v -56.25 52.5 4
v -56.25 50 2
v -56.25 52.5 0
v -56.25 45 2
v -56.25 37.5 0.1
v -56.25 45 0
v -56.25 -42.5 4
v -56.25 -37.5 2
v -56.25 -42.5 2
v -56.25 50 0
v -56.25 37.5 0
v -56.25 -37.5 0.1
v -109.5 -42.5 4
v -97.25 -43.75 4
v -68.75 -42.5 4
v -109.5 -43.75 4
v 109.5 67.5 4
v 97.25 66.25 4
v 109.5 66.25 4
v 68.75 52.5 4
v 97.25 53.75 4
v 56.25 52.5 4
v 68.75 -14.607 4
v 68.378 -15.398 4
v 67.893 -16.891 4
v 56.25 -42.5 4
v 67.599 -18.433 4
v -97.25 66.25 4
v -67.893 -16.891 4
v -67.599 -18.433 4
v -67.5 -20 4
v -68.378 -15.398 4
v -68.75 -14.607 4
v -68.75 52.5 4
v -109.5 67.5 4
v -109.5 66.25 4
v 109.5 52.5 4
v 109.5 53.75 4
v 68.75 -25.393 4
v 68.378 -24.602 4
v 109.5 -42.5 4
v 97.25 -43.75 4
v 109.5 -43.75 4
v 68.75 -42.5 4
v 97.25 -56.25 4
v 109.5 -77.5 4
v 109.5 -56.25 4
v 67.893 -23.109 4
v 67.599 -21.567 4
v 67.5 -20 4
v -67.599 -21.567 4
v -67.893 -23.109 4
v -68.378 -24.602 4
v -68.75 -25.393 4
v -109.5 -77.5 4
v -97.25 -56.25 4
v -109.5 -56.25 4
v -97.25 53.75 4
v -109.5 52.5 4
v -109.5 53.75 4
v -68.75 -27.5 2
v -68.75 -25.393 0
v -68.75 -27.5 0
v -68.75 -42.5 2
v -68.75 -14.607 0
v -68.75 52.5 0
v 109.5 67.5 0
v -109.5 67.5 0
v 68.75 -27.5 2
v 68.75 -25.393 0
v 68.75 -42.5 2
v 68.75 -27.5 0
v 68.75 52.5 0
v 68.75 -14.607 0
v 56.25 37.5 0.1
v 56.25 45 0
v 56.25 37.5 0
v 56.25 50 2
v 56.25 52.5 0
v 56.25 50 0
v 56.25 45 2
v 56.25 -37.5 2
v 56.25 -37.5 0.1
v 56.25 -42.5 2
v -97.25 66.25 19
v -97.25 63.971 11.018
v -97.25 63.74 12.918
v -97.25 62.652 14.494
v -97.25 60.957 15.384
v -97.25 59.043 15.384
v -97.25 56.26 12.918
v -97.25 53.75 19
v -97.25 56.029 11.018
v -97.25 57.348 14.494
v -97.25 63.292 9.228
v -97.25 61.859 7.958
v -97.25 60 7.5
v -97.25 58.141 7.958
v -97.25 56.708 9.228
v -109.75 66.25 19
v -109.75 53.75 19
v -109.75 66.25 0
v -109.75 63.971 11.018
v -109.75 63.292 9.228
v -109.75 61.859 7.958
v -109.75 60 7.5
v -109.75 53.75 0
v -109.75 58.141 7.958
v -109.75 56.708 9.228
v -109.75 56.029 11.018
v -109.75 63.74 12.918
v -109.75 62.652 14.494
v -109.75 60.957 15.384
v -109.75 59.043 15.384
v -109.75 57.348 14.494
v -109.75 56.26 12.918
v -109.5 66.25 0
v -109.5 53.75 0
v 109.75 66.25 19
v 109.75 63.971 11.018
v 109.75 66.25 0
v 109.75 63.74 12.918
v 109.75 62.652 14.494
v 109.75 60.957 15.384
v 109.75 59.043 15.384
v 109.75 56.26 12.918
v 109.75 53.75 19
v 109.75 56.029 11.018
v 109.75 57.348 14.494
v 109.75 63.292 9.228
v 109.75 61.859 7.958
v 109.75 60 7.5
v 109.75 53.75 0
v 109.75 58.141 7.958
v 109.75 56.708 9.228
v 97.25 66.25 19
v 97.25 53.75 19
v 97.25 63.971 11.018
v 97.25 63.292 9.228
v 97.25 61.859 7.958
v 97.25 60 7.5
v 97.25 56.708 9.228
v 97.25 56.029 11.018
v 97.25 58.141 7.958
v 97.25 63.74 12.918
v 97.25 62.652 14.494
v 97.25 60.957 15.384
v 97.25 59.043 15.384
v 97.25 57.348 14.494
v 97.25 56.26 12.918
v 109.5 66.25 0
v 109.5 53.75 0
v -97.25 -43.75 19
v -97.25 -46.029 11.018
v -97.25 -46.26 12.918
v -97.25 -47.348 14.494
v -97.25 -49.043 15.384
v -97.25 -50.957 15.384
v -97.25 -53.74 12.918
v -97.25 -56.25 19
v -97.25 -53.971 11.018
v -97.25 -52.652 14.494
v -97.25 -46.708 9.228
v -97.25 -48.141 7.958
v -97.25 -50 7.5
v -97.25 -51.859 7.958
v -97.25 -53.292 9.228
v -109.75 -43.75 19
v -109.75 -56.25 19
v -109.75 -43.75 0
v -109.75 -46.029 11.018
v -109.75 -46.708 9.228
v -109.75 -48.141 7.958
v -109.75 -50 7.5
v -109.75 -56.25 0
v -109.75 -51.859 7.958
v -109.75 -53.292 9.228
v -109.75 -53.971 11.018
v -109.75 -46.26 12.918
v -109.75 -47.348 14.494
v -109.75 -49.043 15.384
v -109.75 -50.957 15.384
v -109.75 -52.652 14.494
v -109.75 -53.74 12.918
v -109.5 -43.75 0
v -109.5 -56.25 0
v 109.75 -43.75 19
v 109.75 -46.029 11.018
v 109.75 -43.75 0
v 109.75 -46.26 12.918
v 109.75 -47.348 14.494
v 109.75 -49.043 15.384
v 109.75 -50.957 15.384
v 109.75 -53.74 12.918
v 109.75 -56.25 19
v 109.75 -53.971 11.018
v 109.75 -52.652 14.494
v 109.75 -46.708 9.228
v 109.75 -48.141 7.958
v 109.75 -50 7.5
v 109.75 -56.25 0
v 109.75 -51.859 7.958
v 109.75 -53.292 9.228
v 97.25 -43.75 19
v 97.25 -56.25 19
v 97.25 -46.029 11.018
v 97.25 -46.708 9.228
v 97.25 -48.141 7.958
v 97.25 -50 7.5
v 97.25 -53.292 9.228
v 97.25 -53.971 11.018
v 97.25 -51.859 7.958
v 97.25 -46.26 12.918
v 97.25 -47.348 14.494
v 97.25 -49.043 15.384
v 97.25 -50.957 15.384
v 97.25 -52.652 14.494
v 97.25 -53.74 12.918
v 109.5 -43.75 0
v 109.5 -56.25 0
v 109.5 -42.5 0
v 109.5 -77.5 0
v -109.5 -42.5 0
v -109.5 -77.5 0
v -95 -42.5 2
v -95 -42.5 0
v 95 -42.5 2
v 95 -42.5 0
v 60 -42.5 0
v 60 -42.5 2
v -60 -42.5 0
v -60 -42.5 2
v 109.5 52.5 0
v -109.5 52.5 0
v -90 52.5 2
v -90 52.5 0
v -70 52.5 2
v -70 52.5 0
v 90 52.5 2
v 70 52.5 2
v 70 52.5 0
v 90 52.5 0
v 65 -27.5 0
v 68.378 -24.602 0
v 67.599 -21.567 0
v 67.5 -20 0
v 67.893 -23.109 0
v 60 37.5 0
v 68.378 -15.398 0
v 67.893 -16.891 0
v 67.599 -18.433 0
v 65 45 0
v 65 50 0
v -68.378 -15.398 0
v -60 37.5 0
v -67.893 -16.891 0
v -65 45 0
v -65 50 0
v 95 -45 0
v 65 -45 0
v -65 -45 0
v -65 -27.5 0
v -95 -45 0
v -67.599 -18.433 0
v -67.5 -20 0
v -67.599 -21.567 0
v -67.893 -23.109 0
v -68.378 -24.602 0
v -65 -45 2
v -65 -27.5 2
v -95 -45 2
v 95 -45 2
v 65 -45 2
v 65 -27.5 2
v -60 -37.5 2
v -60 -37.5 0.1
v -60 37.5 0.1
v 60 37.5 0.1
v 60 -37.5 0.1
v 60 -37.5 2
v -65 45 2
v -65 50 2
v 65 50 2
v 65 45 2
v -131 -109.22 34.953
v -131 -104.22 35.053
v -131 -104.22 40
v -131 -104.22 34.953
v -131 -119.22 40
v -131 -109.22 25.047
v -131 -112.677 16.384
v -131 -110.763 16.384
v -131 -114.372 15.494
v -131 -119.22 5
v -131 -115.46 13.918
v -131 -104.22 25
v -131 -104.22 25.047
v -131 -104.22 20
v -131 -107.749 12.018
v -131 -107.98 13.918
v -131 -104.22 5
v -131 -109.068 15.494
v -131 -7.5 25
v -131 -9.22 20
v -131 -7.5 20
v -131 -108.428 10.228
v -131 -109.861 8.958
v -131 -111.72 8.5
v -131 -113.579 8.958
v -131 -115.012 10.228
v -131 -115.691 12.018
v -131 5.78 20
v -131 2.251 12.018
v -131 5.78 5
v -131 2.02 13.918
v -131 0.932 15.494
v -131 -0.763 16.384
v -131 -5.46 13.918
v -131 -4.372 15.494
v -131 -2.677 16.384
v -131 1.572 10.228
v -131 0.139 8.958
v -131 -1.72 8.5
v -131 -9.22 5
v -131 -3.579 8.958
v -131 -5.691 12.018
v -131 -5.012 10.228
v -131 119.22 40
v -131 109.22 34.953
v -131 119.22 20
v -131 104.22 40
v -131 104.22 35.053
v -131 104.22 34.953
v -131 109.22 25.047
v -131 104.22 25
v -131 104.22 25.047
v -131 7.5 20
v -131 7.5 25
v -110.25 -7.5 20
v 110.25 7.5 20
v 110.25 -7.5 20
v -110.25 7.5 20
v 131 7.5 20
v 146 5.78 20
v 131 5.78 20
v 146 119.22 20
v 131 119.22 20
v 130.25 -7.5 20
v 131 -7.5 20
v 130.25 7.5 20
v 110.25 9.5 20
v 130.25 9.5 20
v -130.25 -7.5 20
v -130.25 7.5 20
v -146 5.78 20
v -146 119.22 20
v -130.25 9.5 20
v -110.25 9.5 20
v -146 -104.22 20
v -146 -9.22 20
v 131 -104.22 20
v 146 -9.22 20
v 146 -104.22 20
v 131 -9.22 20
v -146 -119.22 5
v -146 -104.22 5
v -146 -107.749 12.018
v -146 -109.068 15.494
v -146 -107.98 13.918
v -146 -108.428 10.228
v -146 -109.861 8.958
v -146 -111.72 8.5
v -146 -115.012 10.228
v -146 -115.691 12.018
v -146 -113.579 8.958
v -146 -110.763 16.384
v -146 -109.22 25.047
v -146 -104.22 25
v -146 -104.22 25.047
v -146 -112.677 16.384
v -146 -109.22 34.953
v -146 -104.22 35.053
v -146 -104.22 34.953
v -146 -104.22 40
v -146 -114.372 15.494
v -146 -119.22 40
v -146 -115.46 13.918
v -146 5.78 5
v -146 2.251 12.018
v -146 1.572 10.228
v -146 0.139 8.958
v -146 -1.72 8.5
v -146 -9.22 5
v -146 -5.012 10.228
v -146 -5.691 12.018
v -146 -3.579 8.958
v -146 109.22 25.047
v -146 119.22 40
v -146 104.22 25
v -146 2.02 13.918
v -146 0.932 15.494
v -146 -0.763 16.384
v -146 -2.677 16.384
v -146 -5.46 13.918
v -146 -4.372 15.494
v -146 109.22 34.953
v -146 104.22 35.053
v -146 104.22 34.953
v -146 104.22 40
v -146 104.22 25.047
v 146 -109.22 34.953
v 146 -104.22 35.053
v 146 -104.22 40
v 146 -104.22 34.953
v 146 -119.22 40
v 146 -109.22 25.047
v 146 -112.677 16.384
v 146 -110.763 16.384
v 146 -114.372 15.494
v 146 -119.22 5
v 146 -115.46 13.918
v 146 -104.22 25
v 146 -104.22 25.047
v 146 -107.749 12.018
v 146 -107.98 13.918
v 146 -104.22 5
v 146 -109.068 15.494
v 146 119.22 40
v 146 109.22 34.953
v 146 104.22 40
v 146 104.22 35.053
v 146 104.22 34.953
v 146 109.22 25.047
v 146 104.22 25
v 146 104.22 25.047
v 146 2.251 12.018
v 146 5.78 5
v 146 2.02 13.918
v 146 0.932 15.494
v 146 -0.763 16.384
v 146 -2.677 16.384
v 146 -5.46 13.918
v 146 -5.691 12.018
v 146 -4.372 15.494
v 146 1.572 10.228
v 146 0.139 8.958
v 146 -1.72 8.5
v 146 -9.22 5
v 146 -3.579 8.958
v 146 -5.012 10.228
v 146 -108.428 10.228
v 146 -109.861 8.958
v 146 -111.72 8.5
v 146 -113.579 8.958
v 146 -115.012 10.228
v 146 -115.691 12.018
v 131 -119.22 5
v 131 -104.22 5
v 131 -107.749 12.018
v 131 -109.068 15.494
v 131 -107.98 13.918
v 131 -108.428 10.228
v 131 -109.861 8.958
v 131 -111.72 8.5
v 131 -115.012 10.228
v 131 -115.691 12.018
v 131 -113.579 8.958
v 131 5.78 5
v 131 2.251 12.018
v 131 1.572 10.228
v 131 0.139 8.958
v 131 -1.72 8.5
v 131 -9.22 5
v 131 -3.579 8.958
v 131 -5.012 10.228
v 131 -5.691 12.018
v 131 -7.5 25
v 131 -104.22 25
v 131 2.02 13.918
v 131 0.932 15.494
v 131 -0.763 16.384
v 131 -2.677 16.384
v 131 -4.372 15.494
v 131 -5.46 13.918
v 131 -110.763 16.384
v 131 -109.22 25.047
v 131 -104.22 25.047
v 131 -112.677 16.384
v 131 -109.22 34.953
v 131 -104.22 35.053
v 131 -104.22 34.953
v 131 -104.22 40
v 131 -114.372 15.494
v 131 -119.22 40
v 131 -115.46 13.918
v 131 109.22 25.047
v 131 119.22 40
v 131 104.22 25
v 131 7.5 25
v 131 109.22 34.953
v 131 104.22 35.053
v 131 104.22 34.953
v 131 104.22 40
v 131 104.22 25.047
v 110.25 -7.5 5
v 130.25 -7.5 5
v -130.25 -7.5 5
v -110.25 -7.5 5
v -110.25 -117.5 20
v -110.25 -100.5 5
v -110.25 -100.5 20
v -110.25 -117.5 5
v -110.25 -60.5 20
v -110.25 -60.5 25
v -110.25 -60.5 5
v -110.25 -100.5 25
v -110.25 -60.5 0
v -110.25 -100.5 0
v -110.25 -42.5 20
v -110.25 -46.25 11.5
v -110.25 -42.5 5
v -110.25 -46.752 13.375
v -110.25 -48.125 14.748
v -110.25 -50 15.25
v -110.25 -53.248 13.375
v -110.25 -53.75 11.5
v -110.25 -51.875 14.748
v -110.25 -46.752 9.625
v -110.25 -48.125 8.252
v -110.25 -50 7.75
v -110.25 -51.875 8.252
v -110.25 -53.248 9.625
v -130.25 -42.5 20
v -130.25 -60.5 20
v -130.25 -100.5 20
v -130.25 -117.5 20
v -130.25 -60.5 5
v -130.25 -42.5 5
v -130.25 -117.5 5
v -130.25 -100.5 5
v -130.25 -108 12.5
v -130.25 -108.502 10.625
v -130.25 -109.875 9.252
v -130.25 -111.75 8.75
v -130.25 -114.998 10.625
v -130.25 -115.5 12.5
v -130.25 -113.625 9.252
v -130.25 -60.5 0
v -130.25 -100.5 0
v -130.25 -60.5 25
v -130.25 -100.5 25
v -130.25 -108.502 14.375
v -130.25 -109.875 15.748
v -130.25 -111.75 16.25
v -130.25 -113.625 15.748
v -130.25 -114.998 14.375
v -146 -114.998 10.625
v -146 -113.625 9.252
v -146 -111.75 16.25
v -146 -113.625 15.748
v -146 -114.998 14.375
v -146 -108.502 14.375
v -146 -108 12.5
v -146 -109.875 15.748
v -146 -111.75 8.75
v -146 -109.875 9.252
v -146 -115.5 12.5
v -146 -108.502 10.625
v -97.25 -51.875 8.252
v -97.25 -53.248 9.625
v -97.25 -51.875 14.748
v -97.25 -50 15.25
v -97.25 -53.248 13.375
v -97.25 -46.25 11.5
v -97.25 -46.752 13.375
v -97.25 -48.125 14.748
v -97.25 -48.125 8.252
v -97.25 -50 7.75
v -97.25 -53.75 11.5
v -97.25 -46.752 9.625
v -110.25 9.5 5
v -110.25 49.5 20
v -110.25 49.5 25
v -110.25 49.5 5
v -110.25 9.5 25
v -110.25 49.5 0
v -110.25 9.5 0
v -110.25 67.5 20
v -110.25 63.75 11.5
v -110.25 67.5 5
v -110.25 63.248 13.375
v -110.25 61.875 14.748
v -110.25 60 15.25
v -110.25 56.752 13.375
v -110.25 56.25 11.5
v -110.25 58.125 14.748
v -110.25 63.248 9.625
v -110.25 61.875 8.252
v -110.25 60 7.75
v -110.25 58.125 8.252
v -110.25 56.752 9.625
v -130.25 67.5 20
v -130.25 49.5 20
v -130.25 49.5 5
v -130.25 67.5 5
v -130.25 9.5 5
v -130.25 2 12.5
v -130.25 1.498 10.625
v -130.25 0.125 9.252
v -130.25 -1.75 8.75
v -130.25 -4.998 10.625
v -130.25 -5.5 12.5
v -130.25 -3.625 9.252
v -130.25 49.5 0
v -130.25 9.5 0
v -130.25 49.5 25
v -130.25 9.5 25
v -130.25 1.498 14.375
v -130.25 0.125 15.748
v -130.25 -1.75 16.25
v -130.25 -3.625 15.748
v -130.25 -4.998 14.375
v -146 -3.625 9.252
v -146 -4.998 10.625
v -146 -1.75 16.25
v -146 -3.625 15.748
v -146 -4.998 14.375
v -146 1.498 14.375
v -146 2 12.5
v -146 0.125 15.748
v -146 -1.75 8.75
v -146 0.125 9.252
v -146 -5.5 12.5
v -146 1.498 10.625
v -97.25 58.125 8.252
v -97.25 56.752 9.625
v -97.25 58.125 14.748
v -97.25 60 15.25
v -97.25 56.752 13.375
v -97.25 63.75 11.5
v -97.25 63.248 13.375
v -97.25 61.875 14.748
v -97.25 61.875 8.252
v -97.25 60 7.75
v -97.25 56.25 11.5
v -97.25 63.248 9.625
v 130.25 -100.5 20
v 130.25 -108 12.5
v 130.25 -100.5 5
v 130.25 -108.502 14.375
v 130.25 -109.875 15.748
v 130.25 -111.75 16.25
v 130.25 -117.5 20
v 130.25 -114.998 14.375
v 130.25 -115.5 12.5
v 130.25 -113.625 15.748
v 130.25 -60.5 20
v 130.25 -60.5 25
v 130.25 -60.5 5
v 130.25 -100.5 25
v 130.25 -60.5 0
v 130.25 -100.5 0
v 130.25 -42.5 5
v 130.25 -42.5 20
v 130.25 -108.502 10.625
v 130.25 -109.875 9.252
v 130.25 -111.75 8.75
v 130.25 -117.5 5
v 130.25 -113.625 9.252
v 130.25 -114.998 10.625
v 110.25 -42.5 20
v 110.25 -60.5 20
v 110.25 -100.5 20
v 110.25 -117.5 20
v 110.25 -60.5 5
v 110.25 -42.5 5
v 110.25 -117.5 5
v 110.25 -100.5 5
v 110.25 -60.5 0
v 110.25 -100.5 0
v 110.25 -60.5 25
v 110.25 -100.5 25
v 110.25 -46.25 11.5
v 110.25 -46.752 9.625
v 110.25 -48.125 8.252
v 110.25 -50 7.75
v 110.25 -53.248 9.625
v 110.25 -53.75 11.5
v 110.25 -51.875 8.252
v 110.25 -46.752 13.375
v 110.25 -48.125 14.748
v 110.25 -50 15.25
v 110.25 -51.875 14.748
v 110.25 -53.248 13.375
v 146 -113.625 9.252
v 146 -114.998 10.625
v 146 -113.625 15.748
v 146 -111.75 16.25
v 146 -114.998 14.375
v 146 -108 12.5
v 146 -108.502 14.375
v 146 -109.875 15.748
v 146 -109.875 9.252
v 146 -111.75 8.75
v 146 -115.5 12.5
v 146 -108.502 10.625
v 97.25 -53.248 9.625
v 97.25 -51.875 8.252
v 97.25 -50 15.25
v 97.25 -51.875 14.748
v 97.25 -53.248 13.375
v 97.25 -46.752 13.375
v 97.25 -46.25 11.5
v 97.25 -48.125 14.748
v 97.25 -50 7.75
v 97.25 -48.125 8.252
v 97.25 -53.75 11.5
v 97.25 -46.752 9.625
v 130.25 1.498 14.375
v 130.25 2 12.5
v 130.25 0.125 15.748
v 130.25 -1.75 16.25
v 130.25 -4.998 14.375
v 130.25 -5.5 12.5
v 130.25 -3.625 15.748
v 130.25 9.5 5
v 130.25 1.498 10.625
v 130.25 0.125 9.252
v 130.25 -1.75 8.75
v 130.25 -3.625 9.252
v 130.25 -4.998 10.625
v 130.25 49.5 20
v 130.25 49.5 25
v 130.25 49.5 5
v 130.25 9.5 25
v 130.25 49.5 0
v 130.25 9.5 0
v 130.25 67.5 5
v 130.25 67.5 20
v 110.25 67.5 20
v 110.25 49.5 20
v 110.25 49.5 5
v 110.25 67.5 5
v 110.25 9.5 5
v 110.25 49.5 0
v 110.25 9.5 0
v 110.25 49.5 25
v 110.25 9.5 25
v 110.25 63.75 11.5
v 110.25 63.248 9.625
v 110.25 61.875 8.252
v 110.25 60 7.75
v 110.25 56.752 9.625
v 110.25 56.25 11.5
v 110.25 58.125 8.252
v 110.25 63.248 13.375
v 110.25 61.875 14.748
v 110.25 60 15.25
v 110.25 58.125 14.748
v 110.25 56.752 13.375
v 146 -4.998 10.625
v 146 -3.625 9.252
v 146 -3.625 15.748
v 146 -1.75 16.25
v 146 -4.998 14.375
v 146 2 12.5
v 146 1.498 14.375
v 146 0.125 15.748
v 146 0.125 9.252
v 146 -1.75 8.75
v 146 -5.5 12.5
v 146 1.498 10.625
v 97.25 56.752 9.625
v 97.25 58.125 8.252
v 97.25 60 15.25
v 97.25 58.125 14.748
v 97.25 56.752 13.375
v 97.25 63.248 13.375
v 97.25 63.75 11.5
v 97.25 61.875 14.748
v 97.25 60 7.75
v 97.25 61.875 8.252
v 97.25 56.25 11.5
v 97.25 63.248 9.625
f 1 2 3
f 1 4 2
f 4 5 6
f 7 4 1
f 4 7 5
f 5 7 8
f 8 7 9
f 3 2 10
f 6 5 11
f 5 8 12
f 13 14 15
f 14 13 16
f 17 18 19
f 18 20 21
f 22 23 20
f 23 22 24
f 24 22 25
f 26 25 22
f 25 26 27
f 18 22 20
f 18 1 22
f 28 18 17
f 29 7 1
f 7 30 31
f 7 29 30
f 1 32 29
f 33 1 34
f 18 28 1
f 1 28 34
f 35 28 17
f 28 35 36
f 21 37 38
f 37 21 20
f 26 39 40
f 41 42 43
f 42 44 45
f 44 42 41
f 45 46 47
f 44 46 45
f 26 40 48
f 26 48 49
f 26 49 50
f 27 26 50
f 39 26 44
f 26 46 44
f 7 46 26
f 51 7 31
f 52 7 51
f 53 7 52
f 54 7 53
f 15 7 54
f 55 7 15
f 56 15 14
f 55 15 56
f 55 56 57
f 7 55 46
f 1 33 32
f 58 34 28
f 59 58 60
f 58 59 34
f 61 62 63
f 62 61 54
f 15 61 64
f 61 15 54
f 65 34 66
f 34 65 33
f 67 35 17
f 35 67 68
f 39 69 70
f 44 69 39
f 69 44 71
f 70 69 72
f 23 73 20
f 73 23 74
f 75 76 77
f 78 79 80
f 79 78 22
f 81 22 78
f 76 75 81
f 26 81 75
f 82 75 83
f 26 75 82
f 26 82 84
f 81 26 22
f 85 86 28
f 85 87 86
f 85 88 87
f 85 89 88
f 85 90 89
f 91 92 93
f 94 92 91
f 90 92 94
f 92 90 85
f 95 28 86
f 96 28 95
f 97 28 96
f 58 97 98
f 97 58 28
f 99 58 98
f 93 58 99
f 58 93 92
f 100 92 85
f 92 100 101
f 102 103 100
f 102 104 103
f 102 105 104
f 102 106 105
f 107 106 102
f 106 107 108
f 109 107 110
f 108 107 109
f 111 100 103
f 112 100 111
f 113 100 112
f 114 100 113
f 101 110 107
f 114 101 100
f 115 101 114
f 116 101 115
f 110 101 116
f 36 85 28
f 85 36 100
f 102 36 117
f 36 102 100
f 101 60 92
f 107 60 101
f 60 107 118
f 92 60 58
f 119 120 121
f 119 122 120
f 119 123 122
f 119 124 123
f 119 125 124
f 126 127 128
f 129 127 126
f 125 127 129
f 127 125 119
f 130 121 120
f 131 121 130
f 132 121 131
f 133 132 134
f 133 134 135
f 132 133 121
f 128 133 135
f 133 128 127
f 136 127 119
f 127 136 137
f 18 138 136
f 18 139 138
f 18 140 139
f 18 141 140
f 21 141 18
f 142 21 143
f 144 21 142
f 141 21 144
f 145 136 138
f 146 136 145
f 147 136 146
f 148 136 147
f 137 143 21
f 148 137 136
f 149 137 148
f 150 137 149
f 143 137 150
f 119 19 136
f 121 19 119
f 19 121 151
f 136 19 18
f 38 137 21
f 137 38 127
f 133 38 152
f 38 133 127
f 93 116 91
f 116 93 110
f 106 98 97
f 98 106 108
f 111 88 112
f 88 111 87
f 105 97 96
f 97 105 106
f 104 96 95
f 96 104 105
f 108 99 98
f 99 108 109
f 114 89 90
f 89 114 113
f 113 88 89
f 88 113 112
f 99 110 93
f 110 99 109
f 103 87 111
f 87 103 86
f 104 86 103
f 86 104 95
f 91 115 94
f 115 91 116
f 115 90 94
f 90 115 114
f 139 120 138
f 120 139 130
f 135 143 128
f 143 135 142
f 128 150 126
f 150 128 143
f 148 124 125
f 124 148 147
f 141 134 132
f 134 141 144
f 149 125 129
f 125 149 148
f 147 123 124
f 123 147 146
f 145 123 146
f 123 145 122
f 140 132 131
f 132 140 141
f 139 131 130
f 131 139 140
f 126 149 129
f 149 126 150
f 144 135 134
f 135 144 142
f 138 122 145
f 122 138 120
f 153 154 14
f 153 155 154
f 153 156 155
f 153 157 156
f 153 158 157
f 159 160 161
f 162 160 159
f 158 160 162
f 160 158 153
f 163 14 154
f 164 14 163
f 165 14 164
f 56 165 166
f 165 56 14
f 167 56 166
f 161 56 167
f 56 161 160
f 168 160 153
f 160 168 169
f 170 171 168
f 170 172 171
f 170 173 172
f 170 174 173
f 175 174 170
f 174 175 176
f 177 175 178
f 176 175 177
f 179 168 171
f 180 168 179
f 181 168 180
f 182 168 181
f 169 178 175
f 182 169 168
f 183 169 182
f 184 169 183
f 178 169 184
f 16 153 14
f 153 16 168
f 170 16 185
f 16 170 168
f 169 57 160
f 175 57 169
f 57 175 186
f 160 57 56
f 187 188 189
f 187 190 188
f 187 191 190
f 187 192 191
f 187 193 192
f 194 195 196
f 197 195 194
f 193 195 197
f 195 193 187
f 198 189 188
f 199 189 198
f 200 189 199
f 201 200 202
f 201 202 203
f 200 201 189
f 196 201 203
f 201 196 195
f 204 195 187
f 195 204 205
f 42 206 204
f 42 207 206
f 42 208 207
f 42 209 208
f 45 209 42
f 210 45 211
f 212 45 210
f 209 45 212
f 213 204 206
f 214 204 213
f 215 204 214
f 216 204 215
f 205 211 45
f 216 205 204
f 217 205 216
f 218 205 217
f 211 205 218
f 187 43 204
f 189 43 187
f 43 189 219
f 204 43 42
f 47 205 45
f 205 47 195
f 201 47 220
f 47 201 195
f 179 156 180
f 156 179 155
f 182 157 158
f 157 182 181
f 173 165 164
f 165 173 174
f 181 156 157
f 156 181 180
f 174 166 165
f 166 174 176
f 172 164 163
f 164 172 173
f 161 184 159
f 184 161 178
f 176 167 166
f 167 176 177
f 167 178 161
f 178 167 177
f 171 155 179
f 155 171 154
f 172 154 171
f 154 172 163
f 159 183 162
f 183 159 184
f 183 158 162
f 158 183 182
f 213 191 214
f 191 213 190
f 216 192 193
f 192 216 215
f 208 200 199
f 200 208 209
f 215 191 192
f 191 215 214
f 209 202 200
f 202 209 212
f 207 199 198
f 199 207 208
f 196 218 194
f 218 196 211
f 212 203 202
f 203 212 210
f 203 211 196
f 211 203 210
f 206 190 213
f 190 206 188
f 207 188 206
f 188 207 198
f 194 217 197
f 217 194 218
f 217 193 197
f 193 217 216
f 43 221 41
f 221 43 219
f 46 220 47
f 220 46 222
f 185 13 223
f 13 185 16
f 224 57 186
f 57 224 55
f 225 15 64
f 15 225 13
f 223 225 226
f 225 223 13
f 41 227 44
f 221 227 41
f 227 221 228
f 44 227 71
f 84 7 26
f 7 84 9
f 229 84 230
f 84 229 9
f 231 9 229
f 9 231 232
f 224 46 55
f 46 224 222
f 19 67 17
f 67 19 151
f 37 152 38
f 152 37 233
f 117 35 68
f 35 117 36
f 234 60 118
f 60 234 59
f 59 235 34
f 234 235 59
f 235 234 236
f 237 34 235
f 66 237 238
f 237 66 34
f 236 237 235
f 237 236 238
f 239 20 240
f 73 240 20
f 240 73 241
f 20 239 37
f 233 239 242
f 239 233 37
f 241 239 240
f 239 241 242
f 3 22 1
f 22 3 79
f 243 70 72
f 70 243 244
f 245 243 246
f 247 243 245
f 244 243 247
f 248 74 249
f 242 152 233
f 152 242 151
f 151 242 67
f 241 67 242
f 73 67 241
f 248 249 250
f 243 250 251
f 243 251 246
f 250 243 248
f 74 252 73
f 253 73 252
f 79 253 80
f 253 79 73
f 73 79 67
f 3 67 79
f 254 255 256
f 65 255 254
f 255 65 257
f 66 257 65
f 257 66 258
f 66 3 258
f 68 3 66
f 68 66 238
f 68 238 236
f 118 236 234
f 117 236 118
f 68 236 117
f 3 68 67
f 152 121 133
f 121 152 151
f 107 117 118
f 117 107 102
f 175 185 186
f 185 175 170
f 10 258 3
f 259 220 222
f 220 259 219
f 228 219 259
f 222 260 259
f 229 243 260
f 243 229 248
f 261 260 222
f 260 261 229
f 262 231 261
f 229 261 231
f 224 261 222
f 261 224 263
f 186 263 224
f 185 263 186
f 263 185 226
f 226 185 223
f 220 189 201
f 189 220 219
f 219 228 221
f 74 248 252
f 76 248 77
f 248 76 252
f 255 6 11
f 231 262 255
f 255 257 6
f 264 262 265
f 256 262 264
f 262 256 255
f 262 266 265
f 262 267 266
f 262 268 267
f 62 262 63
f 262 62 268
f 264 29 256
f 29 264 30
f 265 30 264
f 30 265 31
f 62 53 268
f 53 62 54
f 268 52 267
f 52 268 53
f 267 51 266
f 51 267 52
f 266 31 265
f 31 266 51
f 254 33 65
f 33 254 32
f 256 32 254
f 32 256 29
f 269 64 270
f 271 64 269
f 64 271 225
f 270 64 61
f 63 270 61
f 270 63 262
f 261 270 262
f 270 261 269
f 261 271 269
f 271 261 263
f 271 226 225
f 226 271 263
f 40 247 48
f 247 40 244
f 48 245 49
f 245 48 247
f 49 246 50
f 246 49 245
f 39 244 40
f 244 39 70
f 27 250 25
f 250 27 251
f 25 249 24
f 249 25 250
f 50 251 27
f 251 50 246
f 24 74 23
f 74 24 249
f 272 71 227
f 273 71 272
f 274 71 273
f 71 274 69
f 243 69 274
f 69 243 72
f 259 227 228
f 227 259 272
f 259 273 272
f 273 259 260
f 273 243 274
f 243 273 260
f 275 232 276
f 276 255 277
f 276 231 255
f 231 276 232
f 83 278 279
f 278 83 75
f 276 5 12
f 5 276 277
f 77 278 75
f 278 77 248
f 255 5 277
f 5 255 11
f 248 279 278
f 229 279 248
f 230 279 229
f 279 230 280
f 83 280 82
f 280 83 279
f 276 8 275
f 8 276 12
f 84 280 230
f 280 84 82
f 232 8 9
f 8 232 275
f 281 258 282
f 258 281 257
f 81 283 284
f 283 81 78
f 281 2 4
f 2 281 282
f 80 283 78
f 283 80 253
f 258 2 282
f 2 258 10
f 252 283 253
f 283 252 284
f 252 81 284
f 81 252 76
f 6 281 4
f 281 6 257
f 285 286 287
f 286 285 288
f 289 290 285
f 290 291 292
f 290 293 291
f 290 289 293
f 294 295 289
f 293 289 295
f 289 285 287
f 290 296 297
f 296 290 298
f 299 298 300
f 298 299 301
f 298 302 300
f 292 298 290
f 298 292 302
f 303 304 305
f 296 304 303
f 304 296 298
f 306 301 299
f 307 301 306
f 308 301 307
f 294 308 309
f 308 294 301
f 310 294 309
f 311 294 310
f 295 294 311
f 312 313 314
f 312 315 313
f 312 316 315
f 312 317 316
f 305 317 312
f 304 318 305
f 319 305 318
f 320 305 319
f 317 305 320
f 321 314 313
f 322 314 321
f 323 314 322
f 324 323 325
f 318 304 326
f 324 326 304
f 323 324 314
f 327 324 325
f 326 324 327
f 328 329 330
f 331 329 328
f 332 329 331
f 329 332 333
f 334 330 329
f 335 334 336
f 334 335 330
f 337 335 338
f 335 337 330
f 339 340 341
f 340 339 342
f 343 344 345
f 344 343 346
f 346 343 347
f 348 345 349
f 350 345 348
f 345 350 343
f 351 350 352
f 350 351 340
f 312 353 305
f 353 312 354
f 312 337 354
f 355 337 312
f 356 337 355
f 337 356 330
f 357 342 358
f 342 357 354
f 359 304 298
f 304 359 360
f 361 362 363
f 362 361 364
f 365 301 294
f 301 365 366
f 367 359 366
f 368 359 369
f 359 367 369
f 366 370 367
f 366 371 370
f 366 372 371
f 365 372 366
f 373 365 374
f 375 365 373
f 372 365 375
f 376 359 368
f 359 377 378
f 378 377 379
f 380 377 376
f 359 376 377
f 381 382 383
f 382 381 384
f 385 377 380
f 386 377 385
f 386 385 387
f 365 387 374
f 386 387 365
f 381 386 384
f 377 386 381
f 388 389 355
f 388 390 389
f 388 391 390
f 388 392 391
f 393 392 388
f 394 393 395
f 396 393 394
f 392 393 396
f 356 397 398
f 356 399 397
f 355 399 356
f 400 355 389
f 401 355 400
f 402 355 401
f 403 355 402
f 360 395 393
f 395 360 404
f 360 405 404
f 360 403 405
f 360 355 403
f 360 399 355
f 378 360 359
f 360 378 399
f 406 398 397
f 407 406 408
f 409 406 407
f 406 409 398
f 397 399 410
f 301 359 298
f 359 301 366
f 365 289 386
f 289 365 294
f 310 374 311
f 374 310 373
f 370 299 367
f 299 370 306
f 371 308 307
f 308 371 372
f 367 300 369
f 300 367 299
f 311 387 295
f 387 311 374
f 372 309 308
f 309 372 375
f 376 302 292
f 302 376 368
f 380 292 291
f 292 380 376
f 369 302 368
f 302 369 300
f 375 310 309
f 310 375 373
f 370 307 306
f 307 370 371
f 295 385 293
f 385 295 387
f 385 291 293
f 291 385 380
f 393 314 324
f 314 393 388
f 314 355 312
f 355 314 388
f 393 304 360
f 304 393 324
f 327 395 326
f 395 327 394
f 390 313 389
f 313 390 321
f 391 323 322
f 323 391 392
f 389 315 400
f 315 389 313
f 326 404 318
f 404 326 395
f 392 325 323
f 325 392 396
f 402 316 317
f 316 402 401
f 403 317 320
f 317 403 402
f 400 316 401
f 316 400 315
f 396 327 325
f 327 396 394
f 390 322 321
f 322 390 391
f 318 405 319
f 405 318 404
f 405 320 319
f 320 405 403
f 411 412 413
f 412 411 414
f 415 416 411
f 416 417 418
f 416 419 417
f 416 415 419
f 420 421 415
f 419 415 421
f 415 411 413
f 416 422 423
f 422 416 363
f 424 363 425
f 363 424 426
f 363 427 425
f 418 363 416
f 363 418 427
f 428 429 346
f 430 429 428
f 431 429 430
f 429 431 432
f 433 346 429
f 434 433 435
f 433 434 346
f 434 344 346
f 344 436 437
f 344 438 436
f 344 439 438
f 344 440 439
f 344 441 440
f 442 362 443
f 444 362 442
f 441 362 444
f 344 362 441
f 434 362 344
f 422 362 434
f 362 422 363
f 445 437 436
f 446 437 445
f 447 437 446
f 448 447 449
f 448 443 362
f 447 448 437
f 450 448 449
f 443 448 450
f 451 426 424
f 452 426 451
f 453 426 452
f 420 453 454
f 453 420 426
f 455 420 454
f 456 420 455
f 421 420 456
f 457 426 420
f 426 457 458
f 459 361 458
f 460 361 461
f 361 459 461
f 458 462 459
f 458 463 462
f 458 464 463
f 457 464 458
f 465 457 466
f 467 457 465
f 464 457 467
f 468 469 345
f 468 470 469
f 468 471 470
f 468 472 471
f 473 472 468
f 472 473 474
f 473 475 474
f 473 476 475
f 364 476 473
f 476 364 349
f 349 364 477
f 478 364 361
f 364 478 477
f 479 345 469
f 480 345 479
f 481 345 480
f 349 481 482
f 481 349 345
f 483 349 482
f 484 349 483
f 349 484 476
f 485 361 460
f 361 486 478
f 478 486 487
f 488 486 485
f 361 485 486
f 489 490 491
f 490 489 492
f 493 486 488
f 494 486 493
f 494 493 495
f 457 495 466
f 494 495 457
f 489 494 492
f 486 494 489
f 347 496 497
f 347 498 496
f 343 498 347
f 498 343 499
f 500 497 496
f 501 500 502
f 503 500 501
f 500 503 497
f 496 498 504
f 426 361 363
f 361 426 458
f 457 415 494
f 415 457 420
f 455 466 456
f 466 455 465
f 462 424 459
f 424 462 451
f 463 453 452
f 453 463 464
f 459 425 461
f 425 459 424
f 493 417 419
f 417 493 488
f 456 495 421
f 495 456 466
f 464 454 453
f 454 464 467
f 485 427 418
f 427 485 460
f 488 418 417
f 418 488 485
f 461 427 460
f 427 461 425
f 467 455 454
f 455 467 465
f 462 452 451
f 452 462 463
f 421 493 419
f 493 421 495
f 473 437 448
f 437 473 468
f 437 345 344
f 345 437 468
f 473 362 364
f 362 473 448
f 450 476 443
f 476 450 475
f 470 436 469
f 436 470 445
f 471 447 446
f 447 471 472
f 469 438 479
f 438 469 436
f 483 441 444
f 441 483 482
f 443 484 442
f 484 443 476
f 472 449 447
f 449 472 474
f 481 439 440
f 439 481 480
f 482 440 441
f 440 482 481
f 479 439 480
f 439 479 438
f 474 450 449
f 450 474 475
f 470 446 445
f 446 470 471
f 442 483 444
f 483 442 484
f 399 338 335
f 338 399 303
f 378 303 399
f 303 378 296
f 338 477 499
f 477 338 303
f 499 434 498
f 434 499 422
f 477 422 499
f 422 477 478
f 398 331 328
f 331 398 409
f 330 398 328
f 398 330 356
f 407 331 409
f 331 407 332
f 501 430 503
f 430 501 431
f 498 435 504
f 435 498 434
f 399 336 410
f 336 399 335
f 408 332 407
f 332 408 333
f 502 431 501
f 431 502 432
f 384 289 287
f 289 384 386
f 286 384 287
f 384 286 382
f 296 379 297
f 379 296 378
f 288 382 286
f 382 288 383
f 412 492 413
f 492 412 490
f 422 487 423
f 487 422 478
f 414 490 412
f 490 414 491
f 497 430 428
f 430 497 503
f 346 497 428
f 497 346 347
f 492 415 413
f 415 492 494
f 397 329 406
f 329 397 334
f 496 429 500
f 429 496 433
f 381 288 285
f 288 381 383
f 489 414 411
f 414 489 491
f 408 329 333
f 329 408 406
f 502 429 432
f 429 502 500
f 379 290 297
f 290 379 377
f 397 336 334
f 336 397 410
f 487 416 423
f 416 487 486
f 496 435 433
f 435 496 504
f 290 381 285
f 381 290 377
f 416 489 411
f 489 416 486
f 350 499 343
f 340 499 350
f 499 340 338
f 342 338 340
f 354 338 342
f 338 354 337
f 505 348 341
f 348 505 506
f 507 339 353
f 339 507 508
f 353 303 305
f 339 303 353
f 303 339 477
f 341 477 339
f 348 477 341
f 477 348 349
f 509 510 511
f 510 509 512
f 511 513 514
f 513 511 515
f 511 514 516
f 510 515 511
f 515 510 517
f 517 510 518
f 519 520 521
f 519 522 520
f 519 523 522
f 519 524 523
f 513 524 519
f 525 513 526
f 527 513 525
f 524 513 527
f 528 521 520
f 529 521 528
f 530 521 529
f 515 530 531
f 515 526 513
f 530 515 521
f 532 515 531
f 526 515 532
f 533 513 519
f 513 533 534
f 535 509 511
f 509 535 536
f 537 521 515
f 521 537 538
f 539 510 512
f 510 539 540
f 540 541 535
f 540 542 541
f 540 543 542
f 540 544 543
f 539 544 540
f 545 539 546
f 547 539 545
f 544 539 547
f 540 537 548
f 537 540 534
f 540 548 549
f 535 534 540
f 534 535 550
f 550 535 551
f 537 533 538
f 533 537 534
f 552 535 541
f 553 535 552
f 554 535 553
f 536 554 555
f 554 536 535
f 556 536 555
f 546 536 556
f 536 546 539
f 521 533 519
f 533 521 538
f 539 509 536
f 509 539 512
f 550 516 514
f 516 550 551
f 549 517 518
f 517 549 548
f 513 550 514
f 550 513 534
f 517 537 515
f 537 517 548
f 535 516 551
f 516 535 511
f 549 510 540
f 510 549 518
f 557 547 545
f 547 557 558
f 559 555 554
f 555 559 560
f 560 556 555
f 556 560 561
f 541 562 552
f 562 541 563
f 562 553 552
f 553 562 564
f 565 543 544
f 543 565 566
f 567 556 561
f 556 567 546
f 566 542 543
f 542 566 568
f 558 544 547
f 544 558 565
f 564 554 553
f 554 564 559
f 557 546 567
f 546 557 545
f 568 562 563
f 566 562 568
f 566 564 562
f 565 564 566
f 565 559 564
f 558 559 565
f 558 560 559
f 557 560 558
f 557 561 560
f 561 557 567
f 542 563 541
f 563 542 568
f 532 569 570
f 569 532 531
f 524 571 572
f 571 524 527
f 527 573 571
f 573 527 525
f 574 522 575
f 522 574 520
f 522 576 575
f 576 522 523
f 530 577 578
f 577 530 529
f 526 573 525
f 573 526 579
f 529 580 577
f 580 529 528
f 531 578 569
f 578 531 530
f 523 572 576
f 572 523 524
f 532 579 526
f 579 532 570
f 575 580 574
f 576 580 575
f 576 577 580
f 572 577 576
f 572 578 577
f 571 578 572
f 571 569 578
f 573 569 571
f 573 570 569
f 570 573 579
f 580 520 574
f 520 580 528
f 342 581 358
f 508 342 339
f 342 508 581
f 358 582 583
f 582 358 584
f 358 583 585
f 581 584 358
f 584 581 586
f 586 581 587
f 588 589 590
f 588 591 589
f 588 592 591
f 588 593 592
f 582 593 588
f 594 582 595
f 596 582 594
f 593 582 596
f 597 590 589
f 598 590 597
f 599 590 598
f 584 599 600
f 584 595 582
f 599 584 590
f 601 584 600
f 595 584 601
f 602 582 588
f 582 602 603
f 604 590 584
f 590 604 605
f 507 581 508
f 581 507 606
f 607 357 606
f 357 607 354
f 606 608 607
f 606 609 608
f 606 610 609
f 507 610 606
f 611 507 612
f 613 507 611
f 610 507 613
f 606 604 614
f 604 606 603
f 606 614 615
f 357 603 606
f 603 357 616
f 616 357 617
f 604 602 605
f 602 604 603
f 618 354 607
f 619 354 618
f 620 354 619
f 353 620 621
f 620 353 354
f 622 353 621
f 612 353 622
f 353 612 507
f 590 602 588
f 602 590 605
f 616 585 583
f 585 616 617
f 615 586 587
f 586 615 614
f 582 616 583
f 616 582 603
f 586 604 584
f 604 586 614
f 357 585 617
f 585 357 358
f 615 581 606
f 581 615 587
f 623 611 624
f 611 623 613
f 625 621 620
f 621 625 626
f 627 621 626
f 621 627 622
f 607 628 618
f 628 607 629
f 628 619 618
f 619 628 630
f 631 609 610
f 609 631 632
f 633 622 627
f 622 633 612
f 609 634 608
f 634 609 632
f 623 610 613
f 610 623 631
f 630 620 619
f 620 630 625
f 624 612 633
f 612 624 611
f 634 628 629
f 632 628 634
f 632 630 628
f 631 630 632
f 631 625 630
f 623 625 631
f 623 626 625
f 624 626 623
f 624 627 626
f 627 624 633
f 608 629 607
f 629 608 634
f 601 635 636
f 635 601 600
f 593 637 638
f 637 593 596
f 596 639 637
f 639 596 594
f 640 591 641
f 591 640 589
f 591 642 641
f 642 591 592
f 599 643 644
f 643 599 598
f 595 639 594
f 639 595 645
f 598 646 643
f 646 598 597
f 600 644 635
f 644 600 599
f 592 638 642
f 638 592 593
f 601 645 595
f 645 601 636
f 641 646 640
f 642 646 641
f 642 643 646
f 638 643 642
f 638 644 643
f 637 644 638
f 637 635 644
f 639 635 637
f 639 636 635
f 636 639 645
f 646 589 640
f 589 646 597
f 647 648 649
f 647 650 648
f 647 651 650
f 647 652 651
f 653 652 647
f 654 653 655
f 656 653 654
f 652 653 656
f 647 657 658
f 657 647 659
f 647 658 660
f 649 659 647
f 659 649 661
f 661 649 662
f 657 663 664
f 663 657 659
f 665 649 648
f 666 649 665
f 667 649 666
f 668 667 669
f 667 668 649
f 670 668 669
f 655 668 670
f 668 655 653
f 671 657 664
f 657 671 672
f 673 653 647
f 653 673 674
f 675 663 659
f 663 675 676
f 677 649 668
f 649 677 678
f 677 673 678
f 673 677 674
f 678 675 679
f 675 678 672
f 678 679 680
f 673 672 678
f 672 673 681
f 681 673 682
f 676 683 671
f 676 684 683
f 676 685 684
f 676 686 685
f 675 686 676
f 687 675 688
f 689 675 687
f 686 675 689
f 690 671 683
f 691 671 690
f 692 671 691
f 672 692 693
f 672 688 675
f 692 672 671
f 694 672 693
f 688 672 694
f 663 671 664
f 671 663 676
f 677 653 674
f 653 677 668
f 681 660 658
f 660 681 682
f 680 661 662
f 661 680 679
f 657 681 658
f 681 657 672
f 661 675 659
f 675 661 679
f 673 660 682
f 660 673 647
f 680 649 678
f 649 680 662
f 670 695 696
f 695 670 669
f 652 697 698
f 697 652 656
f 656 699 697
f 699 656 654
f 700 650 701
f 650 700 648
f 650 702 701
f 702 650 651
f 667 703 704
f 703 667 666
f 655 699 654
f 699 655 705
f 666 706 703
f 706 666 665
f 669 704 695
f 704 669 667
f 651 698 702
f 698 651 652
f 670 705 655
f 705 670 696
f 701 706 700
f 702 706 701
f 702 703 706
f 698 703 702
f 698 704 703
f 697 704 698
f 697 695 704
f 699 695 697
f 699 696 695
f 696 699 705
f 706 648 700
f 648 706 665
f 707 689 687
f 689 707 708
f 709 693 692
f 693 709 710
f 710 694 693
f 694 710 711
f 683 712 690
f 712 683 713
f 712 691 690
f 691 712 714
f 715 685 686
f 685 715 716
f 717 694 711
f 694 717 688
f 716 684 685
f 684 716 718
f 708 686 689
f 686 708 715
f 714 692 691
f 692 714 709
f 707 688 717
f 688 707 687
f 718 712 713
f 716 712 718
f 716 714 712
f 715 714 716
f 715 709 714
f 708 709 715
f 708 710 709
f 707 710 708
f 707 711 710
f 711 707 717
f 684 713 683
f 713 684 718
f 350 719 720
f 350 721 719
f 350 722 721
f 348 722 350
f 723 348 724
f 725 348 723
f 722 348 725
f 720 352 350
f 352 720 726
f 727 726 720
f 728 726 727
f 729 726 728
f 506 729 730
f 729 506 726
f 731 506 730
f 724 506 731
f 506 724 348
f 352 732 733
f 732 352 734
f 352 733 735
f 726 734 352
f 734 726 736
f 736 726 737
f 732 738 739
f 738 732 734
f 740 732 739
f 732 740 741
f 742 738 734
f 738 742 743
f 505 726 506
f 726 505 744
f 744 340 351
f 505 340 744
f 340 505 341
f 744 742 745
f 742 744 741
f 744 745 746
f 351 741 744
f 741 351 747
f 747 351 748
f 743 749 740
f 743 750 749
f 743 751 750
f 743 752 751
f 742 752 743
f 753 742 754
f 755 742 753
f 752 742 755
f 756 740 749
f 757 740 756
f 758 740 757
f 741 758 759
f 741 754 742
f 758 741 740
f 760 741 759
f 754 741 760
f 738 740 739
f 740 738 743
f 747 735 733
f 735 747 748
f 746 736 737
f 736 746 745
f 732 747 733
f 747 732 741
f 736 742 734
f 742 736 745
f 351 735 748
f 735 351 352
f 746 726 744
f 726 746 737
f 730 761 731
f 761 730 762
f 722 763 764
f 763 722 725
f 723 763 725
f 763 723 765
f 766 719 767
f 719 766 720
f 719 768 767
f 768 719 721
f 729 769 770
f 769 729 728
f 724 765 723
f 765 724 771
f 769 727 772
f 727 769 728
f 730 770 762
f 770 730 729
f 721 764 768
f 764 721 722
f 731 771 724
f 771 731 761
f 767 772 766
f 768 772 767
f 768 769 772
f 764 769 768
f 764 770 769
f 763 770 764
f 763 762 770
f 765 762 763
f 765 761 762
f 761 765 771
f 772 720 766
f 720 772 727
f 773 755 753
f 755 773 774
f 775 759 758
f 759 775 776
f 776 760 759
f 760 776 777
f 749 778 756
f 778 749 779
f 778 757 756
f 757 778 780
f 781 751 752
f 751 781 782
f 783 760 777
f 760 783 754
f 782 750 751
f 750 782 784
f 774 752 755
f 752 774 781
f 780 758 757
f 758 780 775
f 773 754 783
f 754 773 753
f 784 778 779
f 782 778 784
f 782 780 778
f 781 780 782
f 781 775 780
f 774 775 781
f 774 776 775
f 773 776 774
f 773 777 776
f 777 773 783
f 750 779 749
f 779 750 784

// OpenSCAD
// file: monitor.scad
module monitor(){
    module monitor_cm(){
        total_dims = [21.844, 35.56, 0.9906];
        screen_dims = [total_dims[0]-1, total_dims[1]-1];
        color("LightBlue", 1.0)cube(total_dims, center=true);
        color("blue", 1.0)translate([0,0, total_dims[2]/2])linear_extrude(height=0.01)square(screen_dims, center=true);   
    }
    scale([10,10,10])monitor_cm();
}
monitor();
// file: dash.scad
module dash(){
    module dash_cm(){
        total_area_dims = [23, 14.5];
        
        // total dash
        color("LightBlue")translate([0,0,-1])linear_extrude(height=1)square(total_area_dims, center=true);
        
        // screen
        screen_dims = [12, 7.5];
        screen_center = [0.5, 0.5, 0];
        color("Blue")translate(screen_center)linear_extrude(height=.01)square(screen_dims, center=true);
        
        // buttons
        button_height = 0.2;
        
        radio_button_dims = [screen_dims[0], 0.5];
        radio_button_center = screen_center + [0, -((screen_dims[1]/2)+radio_button_dims[1]/2)];
        color("DodgerBlue")translate(radio_button_center)linear_extrude(height=button_height)square(radio_button_dims, center=true);
        
        // cd player
        cd_player_dims = [13, 0.5];
        cd_player_center = screen_center + [0, screen_dims[1]/2 + 1];
        color("DodgerBlue")translate(cd_player_center)linear_extrude(height=button_height)square(cd_player_dims, center=true);
        
        module side_buttons() {
            color("DeepSkyBlue")translate([0,1,0])linear_extrude(height=button_height)square([2,1], center=true);
            color("DeepSkyBlue")translate([0,-1.75/2,0])linear_extrude(height=button_height)square([2,1.75], center=true);
            color("blue")translate([0,-1.75 * 3/2,0])linear_extrude(height=button_height)square([2,1.75], center=true);
            
            color("CornflowerBlue")translate([0,-5.75,0])linear_extrude(height=2)circle(1.25, $fn=50);
            color("DeepSkyBlue")translate([1.5/2,-5.75 - 2.5 + (1.75/2),0])linear_extrude(height=button_height)square([1.5,1.75], center=true);
            color("blue")translate([-1.5/2,-5.75 - 2.5 + (1.75/2),0])linear_extrude(height=button_height)square([1.5,1.75], center=true);
        }
        for(i=[-1,1]) translate(screen_center + [i*(screen_dims[0]/2+2), screen_dims[1]/2, 0])side_buttons();
    }
    scale([10,10,10])dash_cm();
}
dash();
// main file
use <dash.scad>
use <monitor.scad>

hinge_radius = 4;

module mount2_base() {
    module _mount() {
        hinge_depth = 20;
        //hinge_radius = 4;
        module arm() {
            for(i=[-1,1]) translate([i*62.5,07.5,plate_depth/2])cube([12.5, 120, plate_depth], center=true);
        }
        arm();
        module hinge_base_top() {
            for(i=[-1,1]) translate([i*103.5,60,hinge_depth/2])cube([12.5, 12.5, hinge_depth], center=true);
        }
        module hinge_inner_top() {
            for(i=[-1,1]) translate([i*103.5,60,hinge_depth/2 + plate_depth/2])rotate([0,90,0])cylinder(hinge_depth+0.1, r=hinge_radius, center=true);
        }
        difference(){
            hinge_base_top();
            hinge_inner_top();
        }
        module hinge_base_bottom() {
            for(i=[-1,1]) translate([i*103.5,-50,hinge_depth/2])cube([12.5, 12.5, hinge_depth], center=true);
        }
        module hinge_inner_bottom() {
            for(i=[-1,1]) translate([i*103.5,-50,hinge_depth/2 + plate_depth/2])rotate([0,90,0])cylinder(hinge_depth+0.1, r=hinge_radius, center=true);
        }
        difference(){
            hinge_base_bottom();
            hinge_inner_bottom();
        }
        
        plate_depth = 05;
        translate([0,-60,plate_depth/2])cube([219, 35, plate_depth], center=true);
        translate([0,60,plate_depth/2])cube([219, 15, plate_depth], center=true);
    }
    difference() {
        translate([0,0,-01])_mount();
        translate([-05,-05,0])dash();
    }
}
mount2_base();

module mount2_top() {
    plate_depth = 05;
    module _mount() {
        translate([-103.5-15-20, 0,plate_depth/2+20])cube([15, 218.44, plate_depth], center=true);
        translate([-103.5-15-27.5, 218.44/2-5, 20])cube([15, 15, 20]);
        translate([-103.5-15-27.5, -1*(218.44/2-5)-15, 20])cube([15, 15, 20]);
        translate([103.5+15+20, 0,plate_depth/2+20])cube([15, 218.44, plate_depth], center=true);
        translate([-1*(-103.5-27.5), 218.44/2-5, 20])cube([15, 15, 20]);
        translate([-1*(-103.5-27.5), -1*(218.44/2-5)-15, 20])cube([15, 15, 20]);
        
        module left_hinge_base() {
            difference() {
                translate([-103.5-15-27.5, -1*(218.44/2-5)-15, 5])cube([15, 15, 15]);
                translate([-103.5-15-27.5+(15/2), -1*(218.44/2-5)-(15/2), 12.5])rotate([0,90,0])cylinder(15+0.1, r=hinge_radius, center=true);
            }
        }
        left_hinge_base();
        translate([0, 110, 0])left_hinge_base();
        module right_hinge_base() {
            difference() {
                translate([-1*(-103.5-27.5), -1*(218.44/2-5)-15, 5])cube([15, 15, 15]);
                translate([-1*(-103.5-27.5-(15/2)), -1*(218.44/2-5)-(15/2), 12.5])rotate([0,90,0])cylinder(15+0.1, r=hinge_radius, center=true);
            }
        }
        right_hinge_base();
        translate([0, 110, 0])right_hinge_base();
    }
    translate([0, 0,plate_depth/2+20])cube([2*(103.5+15+20), 15, plate_depth], center=true);
    difference() {
        _mount();
        rotate([0, 0, 90])translate([0,0,30])monitor();
    }
}
mount2_top();

module arm_lower_left() {
    translate([-130.25, -117.5, 5])cube([20, 75, 15]);
    translate([-130.25, -100.5, 0])cube([20, 40, 25]);
    translate([-146, -111.75, 12.5])rotate([0,90,0])cylinder(h=20, r = hinge_radius-0.25);
    translate([-117.25, -50, 11.5])rotate([0,90,0])cylinder(h=20, r = hinge_radius-0.25);
}
arm_lower_left();


module arm_upper_left() {
    translate([0, 110, 0])arm_lower_left();
}
arm_upper_left();



module arm_lower_right() {
    translate([110.25, -117.5, 5])cube([20, 75, 15]);
    translate([110.25, -100.5, 0])cube([20, 40, 25]);
    translate([126, -111.75, 12.5])rotate([0,90,0])cylinder(h=20, r = hinge_radius-0.25);
    translate([117.25-20, -50, 11.5])rotate([0,90,0])cylinder(h=20, r = hinge_radius-0.25);
}
arm_lower_right();


module arm_upper_right() {
    translate([0, 110, 0])arm_lower_right();
}
arm_upper_right();
